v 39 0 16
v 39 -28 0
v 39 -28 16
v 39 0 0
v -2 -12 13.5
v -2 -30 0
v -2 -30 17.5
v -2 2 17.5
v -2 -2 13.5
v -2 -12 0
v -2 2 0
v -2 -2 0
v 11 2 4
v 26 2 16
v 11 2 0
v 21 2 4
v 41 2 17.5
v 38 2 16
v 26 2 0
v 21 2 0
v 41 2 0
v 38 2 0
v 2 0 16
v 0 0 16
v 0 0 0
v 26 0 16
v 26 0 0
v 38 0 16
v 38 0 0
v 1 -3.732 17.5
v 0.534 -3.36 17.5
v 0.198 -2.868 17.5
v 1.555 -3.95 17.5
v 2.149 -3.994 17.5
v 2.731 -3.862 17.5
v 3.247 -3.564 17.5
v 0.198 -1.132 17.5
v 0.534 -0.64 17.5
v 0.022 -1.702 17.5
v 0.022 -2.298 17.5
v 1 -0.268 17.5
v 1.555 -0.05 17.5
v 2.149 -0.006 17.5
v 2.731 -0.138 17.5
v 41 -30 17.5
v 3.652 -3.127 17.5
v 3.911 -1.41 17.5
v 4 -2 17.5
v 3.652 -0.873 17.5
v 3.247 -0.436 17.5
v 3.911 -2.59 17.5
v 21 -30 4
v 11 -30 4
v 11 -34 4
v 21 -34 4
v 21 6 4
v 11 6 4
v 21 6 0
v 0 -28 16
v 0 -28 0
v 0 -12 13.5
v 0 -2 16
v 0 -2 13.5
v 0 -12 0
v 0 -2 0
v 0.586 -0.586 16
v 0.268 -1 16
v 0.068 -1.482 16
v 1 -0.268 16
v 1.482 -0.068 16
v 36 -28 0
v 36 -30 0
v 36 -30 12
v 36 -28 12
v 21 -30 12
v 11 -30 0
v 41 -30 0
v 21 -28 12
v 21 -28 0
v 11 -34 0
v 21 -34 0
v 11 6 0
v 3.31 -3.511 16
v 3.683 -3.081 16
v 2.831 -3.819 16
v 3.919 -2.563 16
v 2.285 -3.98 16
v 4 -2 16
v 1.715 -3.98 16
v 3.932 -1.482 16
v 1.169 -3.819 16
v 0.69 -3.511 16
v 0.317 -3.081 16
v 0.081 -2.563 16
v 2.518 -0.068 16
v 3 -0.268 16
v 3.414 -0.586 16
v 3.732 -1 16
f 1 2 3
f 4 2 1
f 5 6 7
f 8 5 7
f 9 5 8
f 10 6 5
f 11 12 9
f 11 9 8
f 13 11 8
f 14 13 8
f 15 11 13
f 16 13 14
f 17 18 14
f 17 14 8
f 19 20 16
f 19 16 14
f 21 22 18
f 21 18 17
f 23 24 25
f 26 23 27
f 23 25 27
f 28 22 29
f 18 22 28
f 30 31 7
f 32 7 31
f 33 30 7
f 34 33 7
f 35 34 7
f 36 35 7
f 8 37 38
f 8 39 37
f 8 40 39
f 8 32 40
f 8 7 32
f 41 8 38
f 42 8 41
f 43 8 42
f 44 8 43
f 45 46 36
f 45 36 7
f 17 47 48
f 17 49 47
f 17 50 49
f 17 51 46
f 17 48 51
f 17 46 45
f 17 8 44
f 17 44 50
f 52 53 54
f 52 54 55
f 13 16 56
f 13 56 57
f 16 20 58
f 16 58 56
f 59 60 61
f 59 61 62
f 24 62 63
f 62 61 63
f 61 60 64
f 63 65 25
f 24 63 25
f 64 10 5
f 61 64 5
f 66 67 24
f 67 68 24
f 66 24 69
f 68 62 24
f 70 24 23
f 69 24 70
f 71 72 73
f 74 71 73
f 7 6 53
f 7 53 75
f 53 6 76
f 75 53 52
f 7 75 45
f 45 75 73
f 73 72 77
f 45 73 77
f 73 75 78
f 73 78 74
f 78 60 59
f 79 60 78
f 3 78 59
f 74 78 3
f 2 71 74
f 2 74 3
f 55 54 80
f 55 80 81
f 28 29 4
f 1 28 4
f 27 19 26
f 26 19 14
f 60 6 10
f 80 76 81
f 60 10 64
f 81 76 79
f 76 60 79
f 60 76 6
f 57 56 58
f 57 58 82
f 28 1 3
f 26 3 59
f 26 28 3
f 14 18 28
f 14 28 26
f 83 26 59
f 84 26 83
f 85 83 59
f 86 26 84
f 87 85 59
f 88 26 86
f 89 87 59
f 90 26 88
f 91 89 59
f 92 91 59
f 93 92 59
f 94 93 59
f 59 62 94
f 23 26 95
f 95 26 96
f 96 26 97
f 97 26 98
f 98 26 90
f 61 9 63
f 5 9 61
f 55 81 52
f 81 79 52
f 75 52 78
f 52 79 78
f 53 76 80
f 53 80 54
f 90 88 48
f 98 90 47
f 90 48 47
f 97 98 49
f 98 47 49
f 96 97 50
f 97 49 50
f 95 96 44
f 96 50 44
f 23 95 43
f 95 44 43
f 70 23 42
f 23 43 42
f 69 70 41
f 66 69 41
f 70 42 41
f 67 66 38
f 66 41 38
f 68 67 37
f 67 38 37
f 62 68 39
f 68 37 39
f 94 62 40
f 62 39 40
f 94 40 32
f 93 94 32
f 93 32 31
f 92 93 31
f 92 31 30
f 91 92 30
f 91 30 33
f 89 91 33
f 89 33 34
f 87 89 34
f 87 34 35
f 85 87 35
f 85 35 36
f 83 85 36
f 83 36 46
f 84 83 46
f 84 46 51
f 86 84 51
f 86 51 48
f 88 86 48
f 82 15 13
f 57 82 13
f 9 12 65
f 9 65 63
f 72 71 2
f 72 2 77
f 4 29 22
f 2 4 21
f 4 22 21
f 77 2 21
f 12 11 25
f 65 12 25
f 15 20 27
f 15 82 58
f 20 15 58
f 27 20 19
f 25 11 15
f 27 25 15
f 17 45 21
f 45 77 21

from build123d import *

# Parameters (mm, degrees)
F0_W      = 43
F0_H      = 32
F0_W_2    = 39
F0_H_2    = 28
F1_DEPTH  = 16
F2_W      = 43
F2_H      = 32
F3_DEPTH  = 1.5
F4_W      = 10
F4_H      = 13.5
F5_DEPTH  = 2
F6_R      = 2
F7_DEPTH  = 1.5
F8_W      = 12
F8_H      = 16
F9_DEPTH  = 2
F10_W     = 15
F10_H     = 12
F11_DEPTH = 2
F12_W     = 10
F12_H     = 4
F13_DEPTH = 4
F14_W     = 10
F14_H     = 4
F15_DEPTH = 4


with BuildPart() as f1:
    # F0 (on Top) → F1 (new body)
    with BuildSketch(Plane.XY):
        with Locations((19.5, -14)):
            Rectangle(F0_W, F0_H)
        with Locations((19.5, -14)):
            Rectangle(F0_W_2, F0_H_2, mode=Mode.SUBTRACT)
    extrude(amount=F1_DEPTH)

    # F2 (on face) → F3 (join)
    with BuildSketch(Plane.XY.offset(16)):
        with Locations((19.5, -14)):
            Rectangle(F2_W, F2_H)
    extrude(amount=F3_DEPTH)

    # F4 (on face) → F5 (cut, through all)
    with BuildSketch(Plane(origin=(-2, 0, 0), x_dir=(0, -1, 0), z_dir=(-1, 0, 0))):
        with Locations((7, 6.75)):
            Rectangle(F4_W, F4_H)
    extrude(amount=-F5_DEPTH, mode=Mode.SUBTRACT)

    # F6 (on face) → F7 (cut, through all)
    with BuildSketch(Plane.XY.offset(17.5)):
        with Locations((2, -2)):
            Circle(F6_R)
    extrude(amount=-F7_DEPTH, mode=Mode.SUBTRACT)

    # F8 (on face) → F9 (cut, through all)
    with BuildSketch(Plane(origin=(0, 2, 0), x_dir=(-1, 0, 0), z_dir=(0, 1, 0))):
        with Locations((-32, 8)):
            Rectangle(F8_W, F8_H)
    extrude(amount=-F9_DEPTH, mode=Mode.SUBTRACT)

    # F10 (on face) → F11 (cut, through all)
    with BuildSketch(Plane.XZ.offset(30)):
        with Locations((28.5, 6)):
            Rectangle(F10_W, F10_H)
    extrude(amount=-F11_DEPTH, mode=Mode.SUBTRACT)

    # F12 (on face) → F13 (join)
    with BuildSketch(Plane.XZ.offset(30)):
        with Locations((16, 2)):
            Rectangle(F12_W, F12_H)
    extrude(amount=F13_DEPTH)

    # F14 (on face) → F15 (join)
    with BuildSketch(Plane(origin=(0, 2, 0), x_dir=(-1, 0, 0), z_dir=(0, 1, 0))):
        with Locations((-16, 2)):
            Rectangle(F14_W, F14_H)
    extrude(amount=F15_DEPTH)


solid = f1.part
